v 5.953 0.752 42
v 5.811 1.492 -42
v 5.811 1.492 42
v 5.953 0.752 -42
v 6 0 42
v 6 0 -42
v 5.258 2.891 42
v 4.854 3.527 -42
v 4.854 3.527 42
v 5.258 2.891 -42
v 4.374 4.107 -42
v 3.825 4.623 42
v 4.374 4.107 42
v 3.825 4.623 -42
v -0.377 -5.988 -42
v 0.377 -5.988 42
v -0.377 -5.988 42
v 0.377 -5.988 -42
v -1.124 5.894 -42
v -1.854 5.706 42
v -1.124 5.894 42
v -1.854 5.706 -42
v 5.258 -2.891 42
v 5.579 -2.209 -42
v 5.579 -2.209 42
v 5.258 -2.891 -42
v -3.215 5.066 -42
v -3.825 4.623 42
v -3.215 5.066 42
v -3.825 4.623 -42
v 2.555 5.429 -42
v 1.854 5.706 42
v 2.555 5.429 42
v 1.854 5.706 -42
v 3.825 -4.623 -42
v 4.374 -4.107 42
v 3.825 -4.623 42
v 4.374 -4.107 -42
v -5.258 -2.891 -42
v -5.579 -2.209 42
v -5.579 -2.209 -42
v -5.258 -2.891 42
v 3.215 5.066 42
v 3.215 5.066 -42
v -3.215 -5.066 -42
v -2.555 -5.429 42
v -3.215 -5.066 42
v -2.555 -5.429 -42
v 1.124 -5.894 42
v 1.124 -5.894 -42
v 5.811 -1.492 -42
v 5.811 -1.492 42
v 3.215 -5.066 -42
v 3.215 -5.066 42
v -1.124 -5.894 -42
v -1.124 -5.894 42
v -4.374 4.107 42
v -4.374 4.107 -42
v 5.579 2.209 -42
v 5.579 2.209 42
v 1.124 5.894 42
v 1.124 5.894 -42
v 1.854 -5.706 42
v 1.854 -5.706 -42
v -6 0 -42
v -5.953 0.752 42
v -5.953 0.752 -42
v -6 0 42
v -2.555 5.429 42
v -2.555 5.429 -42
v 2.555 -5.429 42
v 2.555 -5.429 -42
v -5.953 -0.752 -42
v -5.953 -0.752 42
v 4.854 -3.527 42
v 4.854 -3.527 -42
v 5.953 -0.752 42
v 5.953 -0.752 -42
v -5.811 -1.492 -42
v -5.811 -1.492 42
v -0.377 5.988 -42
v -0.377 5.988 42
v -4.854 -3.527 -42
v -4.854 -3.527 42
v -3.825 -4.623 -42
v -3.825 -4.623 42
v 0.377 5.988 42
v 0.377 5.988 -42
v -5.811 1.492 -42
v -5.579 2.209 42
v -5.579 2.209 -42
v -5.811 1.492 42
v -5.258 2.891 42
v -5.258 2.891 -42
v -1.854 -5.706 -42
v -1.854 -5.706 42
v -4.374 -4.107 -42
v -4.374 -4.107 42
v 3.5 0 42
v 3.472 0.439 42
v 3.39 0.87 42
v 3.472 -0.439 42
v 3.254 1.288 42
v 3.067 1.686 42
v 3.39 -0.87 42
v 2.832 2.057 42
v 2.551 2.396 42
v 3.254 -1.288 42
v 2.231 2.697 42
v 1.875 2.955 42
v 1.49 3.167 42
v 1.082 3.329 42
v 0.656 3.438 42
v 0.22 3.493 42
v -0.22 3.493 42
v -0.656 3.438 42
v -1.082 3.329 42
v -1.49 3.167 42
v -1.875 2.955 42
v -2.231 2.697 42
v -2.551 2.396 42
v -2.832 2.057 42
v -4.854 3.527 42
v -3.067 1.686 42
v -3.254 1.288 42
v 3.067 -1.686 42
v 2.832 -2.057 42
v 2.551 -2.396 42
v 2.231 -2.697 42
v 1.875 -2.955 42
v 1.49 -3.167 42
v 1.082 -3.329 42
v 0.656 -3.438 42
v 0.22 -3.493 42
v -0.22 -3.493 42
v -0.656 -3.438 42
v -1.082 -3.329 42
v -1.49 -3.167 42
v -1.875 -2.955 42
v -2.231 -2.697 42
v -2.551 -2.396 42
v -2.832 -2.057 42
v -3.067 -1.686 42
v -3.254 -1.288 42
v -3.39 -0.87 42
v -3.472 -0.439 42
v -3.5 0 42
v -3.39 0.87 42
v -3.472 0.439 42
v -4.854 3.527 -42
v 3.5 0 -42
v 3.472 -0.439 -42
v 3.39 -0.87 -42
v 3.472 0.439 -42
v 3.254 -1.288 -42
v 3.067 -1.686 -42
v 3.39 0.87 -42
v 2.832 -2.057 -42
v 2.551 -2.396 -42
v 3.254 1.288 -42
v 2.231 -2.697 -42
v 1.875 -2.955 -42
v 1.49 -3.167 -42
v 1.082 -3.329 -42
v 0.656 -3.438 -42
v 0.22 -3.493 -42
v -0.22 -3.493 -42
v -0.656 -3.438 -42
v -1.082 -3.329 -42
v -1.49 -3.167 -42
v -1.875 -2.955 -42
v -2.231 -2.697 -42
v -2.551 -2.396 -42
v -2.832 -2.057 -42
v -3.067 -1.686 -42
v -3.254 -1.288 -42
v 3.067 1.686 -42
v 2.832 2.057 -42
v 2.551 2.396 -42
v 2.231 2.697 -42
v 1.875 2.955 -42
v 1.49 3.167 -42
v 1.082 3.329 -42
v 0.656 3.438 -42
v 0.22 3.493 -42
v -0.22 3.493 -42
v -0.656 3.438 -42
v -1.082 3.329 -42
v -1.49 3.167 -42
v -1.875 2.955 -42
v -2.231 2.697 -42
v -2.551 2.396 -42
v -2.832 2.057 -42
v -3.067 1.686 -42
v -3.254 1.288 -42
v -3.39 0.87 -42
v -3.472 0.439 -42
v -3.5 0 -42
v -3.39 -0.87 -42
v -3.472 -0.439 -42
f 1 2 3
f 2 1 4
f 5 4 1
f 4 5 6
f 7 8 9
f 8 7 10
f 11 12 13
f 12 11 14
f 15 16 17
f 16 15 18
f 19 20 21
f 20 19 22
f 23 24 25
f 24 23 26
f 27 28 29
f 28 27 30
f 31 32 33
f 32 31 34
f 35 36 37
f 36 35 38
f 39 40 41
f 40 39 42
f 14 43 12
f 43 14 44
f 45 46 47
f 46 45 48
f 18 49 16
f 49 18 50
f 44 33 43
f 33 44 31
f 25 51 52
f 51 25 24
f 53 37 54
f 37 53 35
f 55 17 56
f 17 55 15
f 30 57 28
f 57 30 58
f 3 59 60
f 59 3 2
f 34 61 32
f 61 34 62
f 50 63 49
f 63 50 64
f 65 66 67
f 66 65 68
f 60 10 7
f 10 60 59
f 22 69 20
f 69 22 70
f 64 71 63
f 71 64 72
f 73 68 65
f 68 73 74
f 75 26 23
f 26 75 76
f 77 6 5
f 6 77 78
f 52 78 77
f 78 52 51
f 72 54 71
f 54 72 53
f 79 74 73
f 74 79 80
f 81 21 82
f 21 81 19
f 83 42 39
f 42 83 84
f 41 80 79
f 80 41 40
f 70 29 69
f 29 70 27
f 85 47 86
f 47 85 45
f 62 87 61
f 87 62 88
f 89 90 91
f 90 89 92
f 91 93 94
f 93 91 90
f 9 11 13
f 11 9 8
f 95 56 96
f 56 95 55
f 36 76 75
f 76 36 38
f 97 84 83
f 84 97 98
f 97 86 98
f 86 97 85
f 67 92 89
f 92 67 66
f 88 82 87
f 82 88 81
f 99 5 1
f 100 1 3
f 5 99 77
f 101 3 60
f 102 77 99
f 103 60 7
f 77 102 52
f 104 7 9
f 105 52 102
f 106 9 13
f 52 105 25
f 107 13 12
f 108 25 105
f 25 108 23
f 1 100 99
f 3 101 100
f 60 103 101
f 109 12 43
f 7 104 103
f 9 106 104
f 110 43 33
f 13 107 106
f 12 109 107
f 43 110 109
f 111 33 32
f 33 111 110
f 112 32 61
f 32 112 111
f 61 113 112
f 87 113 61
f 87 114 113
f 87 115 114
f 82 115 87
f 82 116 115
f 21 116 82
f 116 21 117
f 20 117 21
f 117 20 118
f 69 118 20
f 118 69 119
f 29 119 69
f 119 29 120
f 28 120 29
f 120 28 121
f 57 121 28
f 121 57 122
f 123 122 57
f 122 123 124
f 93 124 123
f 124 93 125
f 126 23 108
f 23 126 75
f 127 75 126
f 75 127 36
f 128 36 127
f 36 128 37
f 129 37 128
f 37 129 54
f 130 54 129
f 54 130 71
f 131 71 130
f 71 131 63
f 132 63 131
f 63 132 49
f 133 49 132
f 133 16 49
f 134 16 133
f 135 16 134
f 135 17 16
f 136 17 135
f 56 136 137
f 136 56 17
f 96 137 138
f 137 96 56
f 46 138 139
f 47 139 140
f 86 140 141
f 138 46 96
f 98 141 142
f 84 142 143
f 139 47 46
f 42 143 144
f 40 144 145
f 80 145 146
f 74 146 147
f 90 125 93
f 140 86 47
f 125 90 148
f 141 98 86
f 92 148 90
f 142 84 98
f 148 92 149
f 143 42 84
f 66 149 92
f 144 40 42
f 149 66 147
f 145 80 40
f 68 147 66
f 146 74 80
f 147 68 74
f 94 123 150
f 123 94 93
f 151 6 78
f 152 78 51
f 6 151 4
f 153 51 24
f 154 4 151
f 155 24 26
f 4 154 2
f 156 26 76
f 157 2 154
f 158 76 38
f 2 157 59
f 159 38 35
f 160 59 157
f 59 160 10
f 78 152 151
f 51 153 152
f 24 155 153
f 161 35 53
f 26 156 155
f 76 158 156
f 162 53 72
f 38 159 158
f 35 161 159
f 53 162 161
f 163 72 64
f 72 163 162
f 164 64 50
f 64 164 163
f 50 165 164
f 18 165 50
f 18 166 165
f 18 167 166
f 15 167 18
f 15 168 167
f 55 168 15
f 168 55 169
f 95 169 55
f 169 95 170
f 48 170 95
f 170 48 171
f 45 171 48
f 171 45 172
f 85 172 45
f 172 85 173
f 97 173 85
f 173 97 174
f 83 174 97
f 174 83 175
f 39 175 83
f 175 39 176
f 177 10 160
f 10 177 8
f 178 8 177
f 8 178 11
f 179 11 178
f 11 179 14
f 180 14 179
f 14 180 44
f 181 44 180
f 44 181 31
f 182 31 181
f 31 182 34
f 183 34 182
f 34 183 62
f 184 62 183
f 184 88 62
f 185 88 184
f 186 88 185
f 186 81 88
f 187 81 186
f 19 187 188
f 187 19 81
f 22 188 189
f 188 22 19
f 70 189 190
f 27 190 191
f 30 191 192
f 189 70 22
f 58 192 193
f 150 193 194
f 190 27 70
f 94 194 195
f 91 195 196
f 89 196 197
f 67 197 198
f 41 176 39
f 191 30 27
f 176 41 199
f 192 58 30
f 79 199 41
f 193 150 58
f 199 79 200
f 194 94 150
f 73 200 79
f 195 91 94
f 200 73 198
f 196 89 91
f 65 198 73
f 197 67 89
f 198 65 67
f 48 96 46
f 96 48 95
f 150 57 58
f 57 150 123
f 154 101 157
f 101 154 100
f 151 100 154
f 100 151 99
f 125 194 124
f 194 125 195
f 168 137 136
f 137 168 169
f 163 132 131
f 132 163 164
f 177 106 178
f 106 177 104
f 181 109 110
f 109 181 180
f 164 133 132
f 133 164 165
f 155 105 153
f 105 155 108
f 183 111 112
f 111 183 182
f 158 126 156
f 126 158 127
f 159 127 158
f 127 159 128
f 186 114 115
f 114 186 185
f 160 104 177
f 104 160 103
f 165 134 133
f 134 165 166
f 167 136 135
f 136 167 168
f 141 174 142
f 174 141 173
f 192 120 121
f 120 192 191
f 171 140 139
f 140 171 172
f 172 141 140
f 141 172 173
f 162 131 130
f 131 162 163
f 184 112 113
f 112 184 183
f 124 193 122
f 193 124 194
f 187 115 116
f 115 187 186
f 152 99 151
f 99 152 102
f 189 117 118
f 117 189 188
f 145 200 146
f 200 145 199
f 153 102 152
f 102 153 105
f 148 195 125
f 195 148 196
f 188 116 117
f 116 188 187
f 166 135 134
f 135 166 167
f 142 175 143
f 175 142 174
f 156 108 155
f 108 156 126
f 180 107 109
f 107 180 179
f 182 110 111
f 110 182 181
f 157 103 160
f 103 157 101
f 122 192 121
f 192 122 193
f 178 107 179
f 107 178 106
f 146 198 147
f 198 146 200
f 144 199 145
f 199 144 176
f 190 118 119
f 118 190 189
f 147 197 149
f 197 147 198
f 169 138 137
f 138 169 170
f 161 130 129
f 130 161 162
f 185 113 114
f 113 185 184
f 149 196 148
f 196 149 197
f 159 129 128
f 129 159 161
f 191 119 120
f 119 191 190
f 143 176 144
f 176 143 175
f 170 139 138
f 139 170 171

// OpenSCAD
$fn = 50;


difference() {
	union() {
		translate(v = [0, 0, -42.0000000000]) {
			cylinder(h = 84, r = 6.0000000000);
		}
	}
	union() {
		translate(v = [0, 0, -100.0000000000]) {
			cylinder(h = 200, r = 3.5000000000);
		}
	}
}
